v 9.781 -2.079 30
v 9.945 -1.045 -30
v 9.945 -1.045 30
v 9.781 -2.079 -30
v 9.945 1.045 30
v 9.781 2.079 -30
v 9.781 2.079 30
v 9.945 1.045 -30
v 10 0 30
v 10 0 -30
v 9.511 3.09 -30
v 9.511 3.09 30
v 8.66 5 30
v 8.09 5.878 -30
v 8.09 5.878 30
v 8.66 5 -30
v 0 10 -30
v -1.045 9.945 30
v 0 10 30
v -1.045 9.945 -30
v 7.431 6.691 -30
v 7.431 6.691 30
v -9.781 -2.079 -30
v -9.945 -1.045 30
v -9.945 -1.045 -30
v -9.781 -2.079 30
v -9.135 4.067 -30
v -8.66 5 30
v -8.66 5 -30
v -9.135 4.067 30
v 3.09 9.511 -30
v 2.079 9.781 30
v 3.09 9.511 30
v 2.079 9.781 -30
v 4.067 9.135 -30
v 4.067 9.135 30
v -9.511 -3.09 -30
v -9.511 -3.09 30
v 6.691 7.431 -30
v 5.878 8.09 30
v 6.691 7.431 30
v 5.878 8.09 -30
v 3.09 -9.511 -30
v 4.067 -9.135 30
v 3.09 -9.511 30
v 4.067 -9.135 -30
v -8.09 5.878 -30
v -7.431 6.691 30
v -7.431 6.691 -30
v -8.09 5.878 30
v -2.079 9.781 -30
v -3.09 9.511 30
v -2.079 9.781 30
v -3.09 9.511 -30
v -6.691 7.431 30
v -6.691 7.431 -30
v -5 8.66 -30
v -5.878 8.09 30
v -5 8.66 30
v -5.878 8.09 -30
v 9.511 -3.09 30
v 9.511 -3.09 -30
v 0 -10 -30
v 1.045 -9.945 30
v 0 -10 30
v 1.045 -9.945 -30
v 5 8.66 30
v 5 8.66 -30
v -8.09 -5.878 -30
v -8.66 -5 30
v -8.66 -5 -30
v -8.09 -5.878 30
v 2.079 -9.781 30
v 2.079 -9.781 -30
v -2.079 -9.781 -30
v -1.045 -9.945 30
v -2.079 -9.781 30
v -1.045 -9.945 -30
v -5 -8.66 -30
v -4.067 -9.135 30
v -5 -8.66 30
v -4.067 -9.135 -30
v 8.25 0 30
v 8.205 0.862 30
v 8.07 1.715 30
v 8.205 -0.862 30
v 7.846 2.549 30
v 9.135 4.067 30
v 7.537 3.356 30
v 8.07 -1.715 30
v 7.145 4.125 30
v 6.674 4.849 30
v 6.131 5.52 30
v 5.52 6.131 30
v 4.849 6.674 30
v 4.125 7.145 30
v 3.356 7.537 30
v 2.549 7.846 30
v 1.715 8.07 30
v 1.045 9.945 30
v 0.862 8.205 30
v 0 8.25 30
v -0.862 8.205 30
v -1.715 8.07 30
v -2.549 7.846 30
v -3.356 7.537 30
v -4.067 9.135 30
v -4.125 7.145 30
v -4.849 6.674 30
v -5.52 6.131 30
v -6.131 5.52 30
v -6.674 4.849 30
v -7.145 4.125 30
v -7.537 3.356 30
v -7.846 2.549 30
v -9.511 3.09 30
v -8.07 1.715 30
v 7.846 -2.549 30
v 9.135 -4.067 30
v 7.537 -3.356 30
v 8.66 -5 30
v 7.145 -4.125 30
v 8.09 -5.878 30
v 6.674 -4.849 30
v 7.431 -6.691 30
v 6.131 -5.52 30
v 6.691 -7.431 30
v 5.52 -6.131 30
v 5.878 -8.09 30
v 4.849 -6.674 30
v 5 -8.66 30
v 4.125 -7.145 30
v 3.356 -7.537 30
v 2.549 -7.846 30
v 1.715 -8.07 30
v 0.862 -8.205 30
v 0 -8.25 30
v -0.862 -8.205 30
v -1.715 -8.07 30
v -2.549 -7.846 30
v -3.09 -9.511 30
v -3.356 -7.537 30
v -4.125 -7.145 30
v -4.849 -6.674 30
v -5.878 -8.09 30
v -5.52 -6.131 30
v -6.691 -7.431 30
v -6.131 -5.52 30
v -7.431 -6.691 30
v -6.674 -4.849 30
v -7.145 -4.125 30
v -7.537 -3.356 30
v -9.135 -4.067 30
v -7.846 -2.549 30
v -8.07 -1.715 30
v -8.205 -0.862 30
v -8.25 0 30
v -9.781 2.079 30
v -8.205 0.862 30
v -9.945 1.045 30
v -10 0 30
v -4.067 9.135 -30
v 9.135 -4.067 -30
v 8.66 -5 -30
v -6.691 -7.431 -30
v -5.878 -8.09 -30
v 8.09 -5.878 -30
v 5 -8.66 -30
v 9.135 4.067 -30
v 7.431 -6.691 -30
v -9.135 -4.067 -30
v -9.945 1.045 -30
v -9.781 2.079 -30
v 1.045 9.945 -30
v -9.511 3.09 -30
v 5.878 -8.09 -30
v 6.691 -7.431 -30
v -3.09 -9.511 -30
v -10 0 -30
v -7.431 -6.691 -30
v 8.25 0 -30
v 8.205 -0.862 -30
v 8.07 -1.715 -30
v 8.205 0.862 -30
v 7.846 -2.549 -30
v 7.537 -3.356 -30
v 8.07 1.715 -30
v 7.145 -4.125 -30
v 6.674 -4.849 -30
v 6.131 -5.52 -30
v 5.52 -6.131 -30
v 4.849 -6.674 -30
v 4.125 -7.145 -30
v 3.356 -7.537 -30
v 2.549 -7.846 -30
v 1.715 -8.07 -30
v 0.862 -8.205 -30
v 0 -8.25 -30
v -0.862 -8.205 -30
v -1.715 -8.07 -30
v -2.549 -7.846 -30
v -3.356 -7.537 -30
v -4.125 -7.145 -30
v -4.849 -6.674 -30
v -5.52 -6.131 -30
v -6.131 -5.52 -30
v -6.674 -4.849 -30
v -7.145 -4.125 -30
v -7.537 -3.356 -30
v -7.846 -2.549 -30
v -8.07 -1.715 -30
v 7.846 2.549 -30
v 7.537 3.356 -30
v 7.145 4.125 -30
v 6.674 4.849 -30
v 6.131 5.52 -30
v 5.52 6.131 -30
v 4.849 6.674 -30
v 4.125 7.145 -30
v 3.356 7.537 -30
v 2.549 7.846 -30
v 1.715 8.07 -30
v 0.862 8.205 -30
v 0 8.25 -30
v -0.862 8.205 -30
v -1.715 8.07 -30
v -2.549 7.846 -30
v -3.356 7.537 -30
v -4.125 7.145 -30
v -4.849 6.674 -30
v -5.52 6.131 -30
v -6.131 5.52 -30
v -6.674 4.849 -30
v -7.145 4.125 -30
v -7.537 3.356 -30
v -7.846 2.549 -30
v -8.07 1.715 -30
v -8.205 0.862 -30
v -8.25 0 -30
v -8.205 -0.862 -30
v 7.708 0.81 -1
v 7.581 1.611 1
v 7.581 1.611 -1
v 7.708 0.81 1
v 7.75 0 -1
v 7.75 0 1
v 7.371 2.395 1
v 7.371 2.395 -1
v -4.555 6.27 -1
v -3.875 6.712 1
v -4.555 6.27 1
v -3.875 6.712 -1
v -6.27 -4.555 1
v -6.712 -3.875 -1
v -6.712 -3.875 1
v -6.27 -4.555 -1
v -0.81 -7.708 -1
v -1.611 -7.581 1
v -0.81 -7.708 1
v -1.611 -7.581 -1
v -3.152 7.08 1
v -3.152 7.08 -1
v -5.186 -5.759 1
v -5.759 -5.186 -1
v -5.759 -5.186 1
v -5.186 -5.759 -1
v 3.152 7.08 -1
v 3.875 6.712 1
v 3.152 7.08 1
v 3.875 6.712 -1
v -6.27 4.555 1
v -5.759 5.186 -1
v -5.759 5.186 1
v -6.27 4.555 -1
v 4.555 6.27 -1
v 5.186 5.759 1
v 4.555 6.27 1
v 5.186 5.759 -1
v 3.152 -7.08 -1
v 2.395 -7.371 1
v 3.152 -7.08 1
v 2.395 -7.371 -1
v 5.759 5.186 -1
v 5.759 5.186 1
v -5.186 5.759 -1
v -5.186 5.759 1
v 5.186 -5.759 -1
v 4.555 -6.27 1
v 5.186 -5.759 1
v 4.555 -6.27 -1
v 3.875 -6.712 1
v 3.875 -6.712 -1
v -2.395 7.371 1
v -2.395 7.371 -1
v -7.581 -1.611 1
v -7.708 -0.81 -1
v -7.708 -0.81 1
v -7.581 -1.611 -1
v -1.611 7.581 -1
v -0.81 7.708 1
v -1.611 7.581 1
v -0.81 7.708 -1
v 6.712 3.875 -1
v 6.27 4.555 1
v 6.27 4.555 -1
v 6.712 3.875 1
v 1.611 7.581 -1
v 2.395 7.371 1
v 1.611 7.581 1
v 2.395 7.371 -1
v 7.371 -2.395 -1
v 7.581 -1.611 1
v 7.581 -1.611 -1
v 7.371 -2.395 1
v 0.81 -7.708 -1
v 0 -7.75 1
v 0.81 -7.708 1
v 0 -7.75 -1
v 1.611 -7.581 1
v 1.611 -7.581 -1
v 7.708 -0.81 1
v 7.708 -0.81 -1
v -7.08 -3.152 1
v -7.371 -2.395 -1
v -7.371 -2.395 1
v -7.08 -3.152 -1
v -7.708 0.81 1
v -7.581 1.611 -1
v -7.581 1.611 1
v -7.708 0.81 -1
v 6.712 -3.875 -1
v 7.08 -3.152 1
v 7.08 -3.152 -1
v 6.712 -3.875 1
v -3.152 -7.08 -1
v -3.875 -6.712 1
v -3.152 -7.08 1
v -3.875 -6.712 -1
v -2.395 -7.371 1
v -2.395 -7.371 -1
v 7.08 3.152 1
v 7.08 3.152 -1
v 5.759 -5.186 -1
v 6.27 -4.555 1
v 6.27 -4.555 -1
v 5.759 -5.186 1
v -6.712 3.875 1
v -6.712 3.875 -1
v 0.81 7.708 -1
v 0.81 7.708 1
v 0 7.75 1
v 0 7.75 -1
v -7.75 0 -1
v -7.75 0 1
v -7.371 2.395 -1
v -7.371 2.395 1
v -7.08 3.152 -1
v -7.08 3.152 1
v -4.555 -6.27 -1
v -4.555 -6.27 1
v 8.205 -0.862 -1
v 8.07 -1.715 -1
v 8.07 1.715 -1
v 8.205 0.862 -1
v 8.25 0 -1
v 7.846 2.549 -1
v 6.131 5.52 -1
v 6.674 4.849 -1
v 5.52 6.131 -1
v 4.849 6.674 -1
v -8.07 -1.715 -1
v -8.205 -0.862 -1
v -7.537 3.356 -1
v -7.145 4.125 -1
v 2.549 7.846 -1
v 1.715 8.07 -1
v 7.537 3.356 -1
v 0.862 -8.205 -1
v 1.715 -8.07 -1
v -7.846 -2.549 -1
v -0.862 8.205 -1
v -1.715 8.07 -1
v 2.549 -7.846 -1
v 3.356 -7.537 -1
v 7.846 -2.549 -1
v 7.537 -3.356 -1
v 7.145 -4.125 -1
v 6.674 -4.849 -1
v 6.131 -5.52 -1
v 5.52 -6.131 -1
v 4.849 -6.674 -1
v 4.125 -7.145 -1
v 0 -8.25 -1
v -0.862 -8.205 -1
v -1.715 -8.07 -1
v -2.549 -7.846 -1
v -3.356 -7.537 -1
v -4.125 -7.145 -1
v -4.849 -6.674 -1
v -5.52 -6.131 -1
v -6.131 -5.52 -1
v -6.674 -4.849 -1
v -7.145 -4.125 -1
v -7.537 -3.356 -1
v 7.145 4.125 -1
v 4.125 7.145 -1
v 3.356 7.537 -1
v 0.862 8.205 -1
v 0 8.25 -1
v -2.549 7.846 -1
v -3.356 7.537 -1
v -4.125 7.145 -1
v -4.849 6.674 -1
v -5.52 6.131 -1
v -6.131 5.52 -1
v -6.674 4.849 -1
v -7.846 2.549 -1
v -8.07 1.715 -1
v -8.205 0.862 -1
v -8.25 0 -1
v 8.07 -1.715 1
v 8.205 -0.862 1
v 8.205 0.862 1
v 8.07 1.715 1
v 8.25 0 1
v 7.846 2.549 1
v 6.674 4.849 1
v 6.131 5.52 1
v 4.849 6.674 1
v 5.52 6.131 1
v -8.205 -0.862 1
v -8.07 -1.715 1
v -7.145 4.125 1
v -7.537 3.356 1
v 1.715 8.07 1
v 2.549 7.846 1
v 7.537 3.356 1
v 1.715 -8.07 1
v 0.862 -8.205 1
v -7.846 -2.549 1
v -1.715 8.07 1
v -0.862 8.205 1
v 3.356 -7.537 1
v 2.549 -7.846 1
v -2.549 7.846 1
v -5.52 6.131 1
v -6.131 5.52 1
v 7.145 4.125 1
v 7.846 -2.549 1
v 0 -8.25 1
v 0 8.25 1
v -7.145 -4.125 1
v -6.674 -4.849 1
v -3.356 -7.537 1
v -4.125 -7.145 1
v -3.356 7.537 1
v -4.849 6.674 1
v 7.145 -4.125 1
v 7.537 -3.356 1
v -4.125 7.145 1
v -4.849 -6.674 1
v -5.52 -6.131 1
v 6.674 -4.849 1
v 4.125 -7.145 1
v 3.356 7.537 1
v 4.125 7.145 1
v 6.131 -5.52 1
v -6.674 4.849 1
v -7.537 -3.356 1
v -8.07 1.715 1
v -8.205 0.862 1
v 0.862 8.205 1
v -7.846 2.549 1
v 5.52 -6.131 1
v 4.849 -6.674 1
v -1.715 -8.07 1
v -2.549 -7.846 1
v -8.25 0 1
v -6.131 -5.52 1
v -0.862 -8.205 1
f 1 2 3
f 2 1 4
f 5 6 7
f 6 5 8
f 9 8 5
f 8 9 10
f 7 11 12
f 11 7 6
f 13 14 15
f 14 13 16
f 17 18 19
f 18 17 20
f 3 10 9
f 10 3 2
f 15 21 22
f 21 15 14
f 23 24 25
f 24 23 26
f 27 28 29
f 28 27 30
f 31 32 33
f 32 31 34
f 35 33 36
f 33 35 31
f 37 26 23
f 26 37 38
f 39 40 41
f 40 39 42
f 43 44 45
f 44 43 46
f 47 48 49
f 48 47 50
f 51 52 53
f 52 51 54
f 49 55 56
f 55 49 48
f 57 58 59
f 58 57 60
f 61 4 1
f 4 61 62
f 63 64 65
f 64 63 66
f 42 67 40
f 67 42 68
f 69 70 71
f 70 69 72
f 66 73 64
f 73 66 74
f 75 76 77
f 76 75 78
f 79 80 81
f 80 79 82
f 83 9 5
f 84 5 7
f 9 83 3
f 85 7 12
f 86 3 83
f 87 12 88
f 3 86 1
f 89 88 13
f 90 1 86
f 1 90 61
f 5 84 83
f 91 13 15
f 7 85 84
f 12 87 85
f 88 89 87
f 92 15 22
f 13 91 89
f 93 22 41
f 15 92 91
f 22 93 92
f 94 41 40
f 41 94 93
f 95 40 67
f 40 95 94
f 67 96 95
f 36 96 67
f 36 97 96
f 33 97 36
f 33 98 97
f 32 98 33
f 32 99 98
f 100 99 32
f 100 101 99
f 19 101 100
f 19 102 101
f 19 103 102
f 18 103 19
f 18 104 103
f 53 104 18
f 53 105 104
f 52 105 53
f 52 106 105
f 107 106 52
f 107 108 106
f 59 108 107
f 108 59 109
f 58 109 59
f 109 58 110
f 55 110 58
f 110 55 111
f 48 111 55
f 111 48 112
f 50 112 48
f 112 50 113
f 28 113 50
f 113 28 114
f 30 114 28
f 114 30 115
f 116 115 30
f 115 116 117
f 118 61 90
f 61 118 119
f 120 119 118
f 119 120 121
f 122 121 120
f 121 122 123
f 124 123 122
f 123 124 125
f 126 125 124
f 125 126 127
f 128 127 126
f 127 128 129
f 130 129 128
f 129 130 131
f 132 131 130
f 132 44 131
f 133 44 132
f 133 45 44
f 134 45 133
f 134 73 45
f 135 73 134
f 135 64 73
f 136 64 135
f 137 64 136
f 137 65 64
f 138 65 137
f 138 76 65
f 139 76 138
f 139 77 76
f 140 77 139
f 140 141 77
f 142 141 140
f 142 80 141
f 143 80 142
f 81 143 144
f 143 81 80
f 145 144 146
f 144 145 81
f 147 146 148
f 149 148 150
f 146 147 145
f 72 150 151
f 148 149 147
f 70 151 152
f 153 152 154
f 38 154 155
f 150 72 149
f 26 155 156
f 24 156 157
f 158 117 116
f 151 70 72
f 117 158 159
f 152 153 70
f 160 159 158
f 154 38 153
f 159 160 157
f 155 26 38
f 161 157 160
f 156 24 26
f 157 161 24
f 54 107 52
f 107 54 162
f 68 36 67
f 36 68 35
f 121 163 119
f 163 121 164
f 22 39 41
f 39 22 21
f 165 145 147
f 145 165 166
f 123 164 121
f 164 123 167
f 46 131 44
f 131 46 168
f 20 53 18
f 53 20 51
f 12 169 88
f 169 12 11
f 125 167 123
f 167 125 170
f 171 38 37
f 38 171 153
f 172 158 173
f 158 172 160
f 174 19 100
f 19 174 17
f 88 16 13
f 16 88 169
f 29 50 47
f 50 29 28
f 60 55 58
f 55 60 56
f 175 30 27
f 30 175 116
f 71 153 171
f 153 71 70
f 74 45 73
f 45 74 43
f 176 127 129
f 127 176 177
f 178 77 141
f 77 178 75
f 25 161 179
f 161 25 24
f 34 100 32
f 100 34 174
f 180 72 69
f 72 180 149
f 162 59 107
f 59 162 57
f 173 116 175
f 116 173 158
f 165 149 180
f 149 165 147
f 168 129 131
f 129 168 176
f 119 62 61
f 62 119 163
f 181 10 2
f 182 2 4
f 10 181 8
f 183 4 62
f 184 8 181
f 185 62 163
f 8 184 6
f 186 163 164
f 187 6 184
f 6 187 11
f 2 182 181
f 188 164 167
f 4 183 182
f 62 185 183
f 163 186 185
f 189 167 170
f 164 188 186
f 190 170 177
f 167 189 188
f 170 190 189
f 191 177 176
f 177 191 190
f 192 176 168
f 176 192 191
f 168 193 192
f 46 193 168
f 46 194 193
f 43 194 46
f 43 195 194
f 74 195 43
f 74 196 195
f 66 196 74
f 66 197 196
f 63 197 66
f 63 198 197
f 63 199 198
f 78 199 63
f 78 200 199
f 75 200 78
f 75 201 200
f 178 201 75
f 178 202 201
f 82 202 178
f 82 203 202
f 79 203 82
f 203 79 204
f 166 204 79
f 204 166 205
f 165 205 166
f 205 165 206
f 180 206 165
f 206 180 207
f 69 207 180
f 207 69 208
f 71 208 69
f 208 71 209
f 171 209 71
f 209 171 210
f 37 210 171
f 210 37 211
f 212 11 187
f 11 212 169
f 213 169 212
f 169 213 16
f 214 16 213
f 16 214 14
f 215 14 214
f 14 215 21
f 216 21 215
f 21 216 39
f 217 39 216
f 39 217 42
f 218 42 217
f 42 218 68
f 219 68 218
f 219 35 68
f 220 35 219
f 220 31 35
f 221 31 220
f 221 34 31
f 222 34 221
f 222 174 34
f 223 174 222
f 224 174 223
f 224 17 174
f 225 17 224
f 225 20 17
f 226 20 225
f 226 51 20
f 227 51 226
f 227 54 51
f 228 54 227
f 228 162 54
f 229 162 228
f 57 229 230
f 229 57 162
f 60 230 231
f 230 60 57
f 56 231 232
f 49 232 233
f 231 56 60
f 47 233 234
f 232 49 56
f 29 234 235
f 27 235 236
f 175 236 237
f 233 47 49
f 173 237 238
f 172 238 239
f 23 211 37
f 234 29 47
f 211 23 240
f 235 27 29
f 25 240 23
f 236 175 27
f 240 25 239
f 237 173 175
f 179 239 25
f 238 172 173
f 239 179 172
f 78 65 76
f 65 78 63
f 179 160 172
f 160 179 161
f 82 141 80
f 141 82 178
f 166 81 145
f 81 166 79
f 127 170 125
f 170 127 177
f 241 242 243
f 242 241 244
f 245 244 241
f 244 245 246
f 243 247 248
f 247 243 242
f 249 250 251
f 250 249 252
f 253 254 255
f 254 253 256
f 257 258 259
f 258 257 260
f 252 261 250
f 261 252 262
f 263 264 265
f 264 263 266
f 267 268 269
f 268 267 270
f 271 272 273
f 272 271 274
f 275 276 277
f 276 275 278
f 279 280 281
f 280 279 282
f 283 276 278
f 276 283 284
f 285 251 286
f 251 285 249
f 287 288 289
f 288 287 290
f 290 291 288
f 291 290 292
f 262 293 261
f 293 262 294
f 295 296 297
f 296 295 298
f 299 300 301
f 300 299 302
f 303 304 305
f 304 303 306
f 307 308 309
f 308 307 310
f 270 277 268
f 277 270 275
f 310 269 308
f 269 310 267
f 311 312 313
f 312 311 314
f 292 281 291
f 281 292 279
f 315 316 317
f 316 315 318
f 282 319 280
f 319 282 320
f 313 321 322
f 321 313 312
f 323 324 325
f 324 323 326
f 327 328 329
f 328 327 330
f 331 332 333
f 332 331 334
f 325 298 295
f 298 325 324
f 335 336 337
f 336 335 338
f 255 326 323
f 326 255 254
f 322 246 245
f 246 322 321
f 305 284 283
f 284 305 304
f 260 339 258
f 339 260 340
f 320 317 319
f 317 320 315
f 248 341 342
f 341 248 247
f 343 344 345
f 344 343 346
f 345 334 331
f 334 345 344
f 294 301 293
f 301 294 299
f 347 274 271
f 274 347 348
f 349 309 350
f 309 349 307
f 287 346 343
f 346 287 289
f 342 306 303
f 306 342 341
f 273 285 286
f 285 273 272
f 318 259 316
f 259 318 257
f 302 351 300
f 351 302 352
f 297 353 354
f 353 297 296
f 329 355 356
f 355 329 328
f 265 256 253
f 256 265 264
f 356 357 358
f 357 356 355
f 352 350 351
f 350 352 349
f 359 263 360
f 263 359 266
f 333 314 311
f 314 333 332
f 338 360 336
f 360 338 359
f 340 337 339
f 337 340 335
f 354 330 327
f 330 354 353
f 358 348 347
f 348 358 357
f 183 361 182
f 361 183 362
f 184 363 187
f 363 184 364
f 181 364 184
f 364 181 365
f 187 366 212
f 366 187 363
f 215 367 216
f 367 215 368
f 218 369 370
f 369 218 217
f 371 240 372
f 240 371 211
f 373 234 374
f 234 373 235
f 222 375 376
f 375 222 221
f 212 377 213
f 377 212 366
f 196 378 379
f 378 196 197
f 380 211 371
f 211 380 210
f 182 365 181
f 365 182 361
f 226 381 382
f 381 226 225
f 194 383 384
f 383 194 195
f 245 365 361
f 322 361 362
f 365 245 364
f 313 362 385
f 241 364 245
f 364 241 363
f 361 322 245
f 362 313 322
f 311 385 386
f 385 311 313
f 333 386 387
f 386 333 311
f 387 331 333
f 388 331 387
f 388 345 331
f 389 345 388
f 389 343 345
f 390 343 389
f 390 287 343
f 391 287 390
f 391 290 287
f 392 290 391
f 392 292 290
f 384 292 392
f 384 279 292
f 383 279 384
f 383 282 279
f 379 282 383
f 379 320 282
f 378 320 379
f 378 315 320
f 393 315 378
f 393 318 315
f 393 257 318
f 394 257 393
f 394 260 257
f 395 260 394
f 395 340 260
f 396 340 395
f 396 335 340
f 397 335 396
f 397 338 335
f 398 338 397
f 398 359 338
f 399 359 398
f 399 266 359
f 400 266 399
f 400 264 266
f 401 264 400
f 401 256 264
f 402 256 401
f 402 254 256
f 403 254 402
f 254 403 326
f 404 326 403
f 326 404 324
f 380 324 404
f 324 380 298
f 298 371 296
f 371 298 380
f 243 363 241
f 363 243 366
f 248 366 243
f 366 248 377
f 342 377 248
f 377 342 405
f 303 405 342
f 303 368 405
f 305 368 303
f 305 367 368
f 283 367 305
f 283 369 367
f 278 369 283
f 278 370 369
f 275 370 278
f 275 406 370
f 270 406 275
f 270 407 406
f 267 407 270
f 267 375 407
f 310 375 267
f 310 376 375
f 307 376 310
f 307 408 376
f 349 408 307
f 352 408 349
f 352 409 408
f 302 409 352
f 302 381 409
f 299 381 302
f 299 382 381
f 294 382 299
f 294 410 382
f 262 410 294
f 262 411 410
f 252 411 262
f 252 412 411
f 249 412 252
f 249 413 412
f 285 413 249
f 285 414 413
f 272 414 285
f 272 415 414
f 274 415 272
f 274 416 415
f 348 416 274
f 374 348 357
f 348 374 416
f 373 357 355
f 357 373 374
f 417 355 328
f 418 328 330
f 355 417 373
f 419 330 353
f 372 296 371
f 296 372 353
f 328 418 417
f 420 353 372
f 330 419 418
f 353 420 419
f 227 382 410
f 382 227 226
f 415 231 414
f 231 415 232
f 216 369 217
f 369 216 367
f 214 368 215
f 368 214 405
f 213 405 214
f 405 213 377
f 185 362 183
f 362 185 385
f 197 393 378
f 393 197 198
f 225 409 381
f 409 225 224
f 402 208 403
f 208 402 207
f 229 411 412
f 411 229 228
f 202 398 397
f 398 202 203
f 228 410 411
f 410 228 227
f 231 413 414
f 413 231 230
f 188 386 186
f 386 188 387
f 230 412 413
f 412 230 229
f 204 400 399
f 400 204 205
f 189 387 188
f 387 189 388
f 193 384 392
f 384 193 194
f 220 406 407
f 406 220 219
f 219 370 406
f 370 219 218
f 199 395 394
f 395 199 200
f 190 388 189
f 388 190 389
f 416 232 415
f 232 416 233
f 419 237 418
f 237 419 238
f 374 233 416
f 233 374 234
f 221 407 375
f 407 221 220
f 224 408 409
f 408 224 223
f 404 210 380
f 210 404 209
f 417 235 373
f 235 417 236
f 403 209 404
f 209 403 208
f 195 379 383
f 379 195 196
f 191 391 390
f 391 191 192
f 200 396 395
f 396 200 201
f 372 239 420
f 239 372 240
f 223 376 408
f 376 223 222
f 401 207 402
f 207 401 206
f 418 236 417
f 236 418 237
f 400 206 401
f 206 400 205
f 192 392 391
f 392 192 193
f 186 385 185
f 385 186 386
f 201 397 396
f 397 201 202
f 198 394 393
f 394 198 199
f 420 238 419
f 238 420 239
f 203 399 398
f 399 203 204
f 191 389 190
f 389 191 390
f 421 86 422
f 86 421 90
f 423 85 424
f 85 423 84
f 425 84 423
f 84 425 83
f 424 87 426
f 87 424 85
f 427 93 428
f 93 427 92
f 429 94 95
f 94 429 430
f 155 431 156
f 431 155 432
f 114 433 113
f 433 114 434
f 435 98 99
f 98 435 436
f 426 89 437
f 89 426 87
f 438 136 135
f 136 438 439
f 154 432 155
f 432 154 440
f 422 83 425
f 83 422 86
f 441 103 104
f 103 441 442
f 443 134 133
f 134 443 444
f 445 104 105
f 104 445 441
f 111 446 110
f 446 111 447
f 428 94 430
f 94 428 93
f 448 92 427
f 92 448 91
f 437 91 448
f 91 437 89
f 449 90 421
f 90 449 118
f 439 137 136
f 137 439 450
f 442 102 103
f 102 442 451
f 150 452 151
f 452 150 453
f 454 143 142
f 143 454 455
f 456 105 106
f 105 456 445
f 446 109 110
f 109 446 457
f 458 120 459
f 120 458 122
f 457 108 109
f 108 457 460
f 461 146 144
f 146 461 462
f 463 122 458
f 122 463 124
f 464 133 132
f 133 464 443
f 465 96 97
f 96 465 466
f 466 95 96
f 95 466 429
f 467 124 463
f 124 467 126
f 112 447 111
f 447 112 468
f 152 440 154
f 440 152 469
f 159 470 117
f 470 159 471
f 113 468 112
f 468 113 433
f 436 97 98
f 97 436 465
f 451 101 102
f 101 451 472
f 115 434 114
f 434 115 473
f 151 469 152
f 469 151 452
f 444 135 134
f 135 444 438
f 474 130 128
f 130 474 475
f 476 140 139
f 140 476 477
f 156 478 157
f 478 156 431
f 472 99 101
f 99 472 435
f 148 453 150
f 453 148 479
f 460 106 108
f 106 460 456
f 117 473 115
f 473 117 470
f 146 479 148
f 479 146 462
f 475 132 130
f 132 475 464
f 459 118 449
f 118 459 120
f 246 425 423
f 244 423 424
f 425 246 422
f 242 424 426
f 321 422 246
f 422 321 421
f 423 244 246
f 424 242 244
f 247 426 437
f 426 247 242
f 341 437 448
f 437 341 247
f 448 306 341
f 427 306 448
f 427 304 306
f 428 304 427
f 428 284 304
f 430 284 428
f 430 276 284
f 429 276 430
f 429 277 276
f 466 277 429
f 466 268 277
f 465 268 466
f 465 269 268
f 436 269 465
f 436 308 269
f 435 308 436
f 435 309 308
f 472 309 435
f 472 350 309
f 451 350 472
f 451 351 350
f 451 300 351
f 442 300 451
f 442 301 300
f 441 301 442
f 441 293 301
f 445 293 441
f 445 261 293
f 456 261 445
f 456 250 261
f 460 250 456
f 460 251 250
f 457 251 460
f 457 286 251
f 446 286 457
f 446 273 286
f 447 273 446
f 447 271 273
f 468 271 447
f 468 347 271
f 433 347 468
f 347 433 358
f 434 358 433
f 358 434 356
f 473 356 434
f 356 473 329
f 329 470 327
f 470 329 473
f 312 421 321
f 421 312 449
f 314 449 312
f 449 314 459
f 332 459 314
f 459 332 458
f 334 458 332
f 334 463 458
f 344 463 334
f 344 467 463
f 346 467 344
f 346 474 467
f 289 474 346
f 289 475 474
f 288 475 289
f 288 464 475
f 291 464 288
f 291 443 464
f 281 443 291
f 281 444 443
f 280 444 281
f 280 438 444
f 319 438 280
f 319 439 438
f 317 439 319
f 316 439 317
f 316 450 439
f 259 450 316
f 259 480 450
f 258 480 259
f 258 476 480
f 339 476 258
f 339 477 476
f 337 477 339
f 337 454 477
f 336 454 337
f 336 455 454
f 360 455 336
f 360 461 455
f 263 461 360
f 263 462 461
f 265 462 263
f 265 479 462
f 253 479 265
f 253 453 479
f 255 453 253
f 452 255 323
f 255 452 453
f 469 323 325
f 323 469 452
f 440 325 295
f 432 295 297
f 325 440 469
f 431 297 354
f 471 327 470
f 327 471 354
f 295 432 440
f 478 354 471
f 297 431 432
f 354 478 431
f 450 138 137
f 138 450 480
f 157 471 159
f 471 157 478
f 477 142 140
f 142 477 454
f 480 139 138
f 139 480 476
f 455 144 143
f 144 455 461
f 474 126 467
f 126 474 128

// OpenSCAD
$fn=60;

difference () {
  cylinder(d=20, h=60, center=true);
  cylinder(d=15.5, h=4, center=true);
  translate([0,0,-31])cylinder(d=16.5, h=60, center=true);
  translate([0,0,31])cylinder(d=16.5, h=60, center=true);
}
